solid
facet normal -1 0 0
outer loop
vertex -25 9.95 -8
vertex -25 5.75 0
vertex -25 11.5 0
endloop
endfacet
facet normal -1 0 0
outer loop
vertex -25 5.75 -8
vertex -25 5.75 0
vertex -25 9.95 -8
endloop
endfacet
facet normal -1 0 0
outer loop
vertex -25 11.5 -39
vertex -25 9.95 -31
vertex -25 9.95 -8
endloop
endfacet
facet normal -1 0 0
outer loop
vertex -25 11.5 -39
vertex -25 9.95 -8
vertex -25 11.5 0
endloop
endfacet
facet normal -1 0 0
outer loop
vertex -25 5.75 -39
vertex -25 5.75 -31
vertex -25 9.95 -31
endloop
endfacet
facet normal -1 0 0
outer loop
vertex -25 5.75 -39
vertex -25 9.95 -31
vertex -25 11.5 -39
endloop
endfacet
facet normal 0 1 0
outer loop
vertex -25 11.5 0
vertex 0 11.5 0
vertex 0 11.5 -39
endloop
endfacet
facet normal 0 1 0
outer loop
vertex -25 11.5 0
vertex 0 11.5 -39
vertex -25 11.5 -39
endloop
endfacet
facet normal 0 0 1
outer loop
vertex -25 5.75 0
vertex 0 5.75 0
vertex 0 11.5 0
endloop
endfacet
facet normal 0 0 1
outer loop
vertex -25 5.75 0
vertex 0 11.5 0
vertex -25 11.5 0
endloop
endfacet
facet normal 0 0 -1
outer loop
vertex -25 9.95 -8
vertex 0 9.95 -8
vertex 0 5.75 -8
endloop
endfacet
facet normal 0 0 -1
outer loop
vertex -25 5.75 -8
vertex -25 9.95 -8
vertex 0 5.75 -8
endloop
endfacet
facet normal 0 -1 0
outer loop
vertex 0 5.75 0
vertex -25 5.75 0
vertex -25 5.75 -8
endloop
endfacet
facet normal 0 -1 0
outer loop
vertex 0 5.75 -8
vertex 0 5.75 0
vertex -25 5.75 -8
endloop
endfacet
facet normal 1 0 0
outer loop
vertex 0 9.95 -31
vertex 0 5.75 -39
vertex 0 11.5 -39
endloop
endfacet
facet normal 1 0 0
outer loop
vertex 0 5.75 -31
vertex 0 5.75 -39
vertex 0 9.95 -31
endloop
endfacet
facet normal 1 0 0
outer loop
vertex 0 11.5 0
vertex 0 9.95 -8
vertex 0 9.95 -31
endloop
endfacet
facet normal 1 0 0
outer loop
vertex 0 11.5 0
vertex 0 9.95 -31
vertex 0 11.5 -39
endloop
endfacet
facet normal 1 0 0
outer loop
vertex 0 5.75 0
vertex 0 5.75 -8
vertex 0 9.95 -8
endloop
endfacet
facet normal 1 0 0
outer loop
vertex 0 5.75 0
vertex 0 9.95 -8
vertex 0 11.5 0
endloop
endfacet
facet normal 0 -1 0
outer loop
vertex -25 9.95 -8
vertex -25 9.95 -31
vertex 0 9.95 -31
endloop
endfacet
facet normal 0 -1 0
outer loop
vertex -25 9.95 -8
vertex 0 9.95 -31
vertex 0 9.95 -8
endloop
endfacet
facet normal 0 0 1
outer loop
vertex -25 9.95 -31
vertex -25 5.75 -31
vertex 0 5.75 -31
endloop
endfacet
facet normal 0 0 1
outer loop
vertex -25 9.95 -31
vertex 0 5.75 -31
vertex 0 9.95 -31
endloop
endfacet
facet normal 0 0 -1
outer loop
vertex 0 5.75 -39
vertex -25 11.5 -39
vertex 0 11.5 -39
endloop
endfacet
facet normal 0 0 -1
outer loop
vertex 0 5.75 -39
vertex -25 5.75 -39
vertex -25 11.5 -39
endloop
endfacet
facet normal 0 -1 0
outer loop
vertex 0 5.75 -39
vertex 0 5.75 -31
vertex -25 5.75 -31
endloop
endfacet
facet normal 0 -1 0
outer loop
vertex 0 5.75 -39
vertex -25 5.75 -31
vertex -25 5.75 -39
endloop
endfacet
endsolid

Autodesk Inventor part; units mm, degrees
ref_plane "YZ Plane" through (0, 0, 0) normal (1, 0, 0) x (0, 1, 0)
ref_plane "XZ Plane" through (0, 0, 0) normal (0, 1, 0) x (-1, 0, 0)
ref_plane "XY Plane" through (0, 0, 0) normal (0, 0, 1) x (1, 0, 0)
sketch "Sketch1" plane through (0, 0, 0) normal (0, 1, 0) x (-1, 0, 0)
  line L0 (0, 0) -> (25, 0)
  line L1 (25, 0) -> (25, -39)
  line L2 (25, -39) -> (0, -39)
  line L3 (0, -39) -> (0, 0)
  line L4 (0, -8) -> (25, -8)
  line L5 (25, -8) -> (25, -31)
  line L6 (25, -31) -> (0, -31)
  line L7 (0, -31) -> (0, -8)
  dimension "d0" = 39
  dimension "d1" = 25
  dimension "d2" = 23
  dimension "d3" = 8
  dimension "d4" = 8
extrude "Extrusion1" add sketch "Sketch1" along normal blind 11.5
sketch "Sketch3" plane through (0, 0, 0) normal (1, 0, 0) x (0, 0, -1)
  line L0 (0, 0) -> (0, 11.5) projected
  line L1 (0, 0) -> (39, 0) projected
  line L2 (8, 1.55) -> (31, 1.55)
  line L3 (31, 1.55) -> (31, 9.95)
  line L4 (31, 9.95) -> (8, 9.95)
  line L5 (8, 9.95) -> (8, 1.55)
  line L6 (8, 1.55) -> (31, 9.95) construction
  line L7 (31, 1.55) -> (8, 9.95) construction
  point P0 (0, 5.75)
  point P1 (19.5, 0)
  point P2 (19.5, 5.75)
  dimension "d9" = 23
  dimension "d10" = 8.4
  dimension "d25" = 8
extrude "Extrusion2" cut sketch "Sketch3" against normal through all
sketch "Sketch4" plane through (0, 0, 0) normal (1, 0, 0) x (0, 0, -1)
  line L0 (0, 0) -> (0, 11.5) projected
  line L1 (0, 5.75) -> (39, 5.75)
  line L2 (39, 0) -> (39, 11.5) projected
split body "Split1" sketch "Sketch4" result one side removed curves L1 removed pieces at (-8.3333, 0.5, -13)
properties part number "Servo mount top v2"
